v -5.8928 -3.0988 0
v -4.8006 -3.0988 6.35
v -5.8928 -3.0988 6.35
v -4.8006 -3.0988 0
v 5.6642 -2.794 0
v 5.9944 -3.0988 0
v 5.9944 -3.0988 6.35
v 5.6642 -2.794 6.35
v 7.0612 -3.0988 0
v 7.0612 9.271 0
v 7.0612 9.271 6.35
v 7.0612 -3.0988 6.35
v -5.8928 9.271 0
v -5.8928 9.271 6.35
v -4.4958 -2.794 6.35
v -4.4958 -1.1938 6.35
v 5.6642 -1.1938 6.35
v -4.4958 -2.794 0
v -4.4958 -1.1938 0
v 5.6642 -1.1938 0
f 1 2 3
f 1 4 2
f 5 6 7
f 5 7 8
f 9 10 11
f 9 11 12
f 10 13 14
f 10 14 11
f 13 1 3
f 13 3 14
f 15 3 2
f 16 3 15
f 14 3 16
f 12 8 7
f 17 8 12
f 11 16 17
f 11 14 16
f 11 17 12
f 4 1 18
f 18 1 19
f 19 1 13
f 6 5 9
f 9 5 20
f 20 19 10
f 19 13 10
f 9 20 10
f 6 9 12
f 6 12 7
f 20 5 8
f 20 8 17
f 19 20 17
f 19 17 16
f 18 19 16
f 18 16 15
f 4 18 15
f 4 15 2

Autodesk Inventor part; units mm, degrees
ref_plane "YZ Plane" through (0, 0, 0) normal (1, 0, 0) x (0, 1, 0)
ref_plane "XZ Plane" through (0, 0, 0) normal (0, 1, 0) x (-1, 0, 0)
ref_plane "XY Plane" through (0, 0, 0) normal (0, 0, 1) x (1, 0, 0)
sketch "DM3D-SF, DX3D-SF_53" plane through (0, 0, 0) normal (0, 0, 1) x (1, 0, 0)
  line L0 (-5.8928, 9.271) -> (7.0612, 9.271)
  line L1 (7.0612, 9.271) -> (7.0612, -3.0988)
  line L2 (7.0612, -3.0988) -> (5.9944, -3.0988)
  line L3 (5.9944, -3.0988) -> (5.6642, -2.794)
  line L4 (5.6642, -2.794) -> (5.6642, -1.1938)
  line L5 (5.6642, -1.1938) -> (-4.4958, -1.1938)
  line L6 (-4.4958, -1.1938) -> (-4.4958, -2.794)
  line L7 (-4.4958, -2.794) -> (-4.8006, -3.0988)
  line L8 (-4.8006, -3.0988) -> (-5.8928, -3.0988)
  line L9 (-5.8928, -3.0988) -> (-5.8928, 9.271)
extrude "Extrusion1" add sketch "DM3D-SF, DX3D-SF_53" along normal blind 6.35
properties part number "DX3D-SF"
